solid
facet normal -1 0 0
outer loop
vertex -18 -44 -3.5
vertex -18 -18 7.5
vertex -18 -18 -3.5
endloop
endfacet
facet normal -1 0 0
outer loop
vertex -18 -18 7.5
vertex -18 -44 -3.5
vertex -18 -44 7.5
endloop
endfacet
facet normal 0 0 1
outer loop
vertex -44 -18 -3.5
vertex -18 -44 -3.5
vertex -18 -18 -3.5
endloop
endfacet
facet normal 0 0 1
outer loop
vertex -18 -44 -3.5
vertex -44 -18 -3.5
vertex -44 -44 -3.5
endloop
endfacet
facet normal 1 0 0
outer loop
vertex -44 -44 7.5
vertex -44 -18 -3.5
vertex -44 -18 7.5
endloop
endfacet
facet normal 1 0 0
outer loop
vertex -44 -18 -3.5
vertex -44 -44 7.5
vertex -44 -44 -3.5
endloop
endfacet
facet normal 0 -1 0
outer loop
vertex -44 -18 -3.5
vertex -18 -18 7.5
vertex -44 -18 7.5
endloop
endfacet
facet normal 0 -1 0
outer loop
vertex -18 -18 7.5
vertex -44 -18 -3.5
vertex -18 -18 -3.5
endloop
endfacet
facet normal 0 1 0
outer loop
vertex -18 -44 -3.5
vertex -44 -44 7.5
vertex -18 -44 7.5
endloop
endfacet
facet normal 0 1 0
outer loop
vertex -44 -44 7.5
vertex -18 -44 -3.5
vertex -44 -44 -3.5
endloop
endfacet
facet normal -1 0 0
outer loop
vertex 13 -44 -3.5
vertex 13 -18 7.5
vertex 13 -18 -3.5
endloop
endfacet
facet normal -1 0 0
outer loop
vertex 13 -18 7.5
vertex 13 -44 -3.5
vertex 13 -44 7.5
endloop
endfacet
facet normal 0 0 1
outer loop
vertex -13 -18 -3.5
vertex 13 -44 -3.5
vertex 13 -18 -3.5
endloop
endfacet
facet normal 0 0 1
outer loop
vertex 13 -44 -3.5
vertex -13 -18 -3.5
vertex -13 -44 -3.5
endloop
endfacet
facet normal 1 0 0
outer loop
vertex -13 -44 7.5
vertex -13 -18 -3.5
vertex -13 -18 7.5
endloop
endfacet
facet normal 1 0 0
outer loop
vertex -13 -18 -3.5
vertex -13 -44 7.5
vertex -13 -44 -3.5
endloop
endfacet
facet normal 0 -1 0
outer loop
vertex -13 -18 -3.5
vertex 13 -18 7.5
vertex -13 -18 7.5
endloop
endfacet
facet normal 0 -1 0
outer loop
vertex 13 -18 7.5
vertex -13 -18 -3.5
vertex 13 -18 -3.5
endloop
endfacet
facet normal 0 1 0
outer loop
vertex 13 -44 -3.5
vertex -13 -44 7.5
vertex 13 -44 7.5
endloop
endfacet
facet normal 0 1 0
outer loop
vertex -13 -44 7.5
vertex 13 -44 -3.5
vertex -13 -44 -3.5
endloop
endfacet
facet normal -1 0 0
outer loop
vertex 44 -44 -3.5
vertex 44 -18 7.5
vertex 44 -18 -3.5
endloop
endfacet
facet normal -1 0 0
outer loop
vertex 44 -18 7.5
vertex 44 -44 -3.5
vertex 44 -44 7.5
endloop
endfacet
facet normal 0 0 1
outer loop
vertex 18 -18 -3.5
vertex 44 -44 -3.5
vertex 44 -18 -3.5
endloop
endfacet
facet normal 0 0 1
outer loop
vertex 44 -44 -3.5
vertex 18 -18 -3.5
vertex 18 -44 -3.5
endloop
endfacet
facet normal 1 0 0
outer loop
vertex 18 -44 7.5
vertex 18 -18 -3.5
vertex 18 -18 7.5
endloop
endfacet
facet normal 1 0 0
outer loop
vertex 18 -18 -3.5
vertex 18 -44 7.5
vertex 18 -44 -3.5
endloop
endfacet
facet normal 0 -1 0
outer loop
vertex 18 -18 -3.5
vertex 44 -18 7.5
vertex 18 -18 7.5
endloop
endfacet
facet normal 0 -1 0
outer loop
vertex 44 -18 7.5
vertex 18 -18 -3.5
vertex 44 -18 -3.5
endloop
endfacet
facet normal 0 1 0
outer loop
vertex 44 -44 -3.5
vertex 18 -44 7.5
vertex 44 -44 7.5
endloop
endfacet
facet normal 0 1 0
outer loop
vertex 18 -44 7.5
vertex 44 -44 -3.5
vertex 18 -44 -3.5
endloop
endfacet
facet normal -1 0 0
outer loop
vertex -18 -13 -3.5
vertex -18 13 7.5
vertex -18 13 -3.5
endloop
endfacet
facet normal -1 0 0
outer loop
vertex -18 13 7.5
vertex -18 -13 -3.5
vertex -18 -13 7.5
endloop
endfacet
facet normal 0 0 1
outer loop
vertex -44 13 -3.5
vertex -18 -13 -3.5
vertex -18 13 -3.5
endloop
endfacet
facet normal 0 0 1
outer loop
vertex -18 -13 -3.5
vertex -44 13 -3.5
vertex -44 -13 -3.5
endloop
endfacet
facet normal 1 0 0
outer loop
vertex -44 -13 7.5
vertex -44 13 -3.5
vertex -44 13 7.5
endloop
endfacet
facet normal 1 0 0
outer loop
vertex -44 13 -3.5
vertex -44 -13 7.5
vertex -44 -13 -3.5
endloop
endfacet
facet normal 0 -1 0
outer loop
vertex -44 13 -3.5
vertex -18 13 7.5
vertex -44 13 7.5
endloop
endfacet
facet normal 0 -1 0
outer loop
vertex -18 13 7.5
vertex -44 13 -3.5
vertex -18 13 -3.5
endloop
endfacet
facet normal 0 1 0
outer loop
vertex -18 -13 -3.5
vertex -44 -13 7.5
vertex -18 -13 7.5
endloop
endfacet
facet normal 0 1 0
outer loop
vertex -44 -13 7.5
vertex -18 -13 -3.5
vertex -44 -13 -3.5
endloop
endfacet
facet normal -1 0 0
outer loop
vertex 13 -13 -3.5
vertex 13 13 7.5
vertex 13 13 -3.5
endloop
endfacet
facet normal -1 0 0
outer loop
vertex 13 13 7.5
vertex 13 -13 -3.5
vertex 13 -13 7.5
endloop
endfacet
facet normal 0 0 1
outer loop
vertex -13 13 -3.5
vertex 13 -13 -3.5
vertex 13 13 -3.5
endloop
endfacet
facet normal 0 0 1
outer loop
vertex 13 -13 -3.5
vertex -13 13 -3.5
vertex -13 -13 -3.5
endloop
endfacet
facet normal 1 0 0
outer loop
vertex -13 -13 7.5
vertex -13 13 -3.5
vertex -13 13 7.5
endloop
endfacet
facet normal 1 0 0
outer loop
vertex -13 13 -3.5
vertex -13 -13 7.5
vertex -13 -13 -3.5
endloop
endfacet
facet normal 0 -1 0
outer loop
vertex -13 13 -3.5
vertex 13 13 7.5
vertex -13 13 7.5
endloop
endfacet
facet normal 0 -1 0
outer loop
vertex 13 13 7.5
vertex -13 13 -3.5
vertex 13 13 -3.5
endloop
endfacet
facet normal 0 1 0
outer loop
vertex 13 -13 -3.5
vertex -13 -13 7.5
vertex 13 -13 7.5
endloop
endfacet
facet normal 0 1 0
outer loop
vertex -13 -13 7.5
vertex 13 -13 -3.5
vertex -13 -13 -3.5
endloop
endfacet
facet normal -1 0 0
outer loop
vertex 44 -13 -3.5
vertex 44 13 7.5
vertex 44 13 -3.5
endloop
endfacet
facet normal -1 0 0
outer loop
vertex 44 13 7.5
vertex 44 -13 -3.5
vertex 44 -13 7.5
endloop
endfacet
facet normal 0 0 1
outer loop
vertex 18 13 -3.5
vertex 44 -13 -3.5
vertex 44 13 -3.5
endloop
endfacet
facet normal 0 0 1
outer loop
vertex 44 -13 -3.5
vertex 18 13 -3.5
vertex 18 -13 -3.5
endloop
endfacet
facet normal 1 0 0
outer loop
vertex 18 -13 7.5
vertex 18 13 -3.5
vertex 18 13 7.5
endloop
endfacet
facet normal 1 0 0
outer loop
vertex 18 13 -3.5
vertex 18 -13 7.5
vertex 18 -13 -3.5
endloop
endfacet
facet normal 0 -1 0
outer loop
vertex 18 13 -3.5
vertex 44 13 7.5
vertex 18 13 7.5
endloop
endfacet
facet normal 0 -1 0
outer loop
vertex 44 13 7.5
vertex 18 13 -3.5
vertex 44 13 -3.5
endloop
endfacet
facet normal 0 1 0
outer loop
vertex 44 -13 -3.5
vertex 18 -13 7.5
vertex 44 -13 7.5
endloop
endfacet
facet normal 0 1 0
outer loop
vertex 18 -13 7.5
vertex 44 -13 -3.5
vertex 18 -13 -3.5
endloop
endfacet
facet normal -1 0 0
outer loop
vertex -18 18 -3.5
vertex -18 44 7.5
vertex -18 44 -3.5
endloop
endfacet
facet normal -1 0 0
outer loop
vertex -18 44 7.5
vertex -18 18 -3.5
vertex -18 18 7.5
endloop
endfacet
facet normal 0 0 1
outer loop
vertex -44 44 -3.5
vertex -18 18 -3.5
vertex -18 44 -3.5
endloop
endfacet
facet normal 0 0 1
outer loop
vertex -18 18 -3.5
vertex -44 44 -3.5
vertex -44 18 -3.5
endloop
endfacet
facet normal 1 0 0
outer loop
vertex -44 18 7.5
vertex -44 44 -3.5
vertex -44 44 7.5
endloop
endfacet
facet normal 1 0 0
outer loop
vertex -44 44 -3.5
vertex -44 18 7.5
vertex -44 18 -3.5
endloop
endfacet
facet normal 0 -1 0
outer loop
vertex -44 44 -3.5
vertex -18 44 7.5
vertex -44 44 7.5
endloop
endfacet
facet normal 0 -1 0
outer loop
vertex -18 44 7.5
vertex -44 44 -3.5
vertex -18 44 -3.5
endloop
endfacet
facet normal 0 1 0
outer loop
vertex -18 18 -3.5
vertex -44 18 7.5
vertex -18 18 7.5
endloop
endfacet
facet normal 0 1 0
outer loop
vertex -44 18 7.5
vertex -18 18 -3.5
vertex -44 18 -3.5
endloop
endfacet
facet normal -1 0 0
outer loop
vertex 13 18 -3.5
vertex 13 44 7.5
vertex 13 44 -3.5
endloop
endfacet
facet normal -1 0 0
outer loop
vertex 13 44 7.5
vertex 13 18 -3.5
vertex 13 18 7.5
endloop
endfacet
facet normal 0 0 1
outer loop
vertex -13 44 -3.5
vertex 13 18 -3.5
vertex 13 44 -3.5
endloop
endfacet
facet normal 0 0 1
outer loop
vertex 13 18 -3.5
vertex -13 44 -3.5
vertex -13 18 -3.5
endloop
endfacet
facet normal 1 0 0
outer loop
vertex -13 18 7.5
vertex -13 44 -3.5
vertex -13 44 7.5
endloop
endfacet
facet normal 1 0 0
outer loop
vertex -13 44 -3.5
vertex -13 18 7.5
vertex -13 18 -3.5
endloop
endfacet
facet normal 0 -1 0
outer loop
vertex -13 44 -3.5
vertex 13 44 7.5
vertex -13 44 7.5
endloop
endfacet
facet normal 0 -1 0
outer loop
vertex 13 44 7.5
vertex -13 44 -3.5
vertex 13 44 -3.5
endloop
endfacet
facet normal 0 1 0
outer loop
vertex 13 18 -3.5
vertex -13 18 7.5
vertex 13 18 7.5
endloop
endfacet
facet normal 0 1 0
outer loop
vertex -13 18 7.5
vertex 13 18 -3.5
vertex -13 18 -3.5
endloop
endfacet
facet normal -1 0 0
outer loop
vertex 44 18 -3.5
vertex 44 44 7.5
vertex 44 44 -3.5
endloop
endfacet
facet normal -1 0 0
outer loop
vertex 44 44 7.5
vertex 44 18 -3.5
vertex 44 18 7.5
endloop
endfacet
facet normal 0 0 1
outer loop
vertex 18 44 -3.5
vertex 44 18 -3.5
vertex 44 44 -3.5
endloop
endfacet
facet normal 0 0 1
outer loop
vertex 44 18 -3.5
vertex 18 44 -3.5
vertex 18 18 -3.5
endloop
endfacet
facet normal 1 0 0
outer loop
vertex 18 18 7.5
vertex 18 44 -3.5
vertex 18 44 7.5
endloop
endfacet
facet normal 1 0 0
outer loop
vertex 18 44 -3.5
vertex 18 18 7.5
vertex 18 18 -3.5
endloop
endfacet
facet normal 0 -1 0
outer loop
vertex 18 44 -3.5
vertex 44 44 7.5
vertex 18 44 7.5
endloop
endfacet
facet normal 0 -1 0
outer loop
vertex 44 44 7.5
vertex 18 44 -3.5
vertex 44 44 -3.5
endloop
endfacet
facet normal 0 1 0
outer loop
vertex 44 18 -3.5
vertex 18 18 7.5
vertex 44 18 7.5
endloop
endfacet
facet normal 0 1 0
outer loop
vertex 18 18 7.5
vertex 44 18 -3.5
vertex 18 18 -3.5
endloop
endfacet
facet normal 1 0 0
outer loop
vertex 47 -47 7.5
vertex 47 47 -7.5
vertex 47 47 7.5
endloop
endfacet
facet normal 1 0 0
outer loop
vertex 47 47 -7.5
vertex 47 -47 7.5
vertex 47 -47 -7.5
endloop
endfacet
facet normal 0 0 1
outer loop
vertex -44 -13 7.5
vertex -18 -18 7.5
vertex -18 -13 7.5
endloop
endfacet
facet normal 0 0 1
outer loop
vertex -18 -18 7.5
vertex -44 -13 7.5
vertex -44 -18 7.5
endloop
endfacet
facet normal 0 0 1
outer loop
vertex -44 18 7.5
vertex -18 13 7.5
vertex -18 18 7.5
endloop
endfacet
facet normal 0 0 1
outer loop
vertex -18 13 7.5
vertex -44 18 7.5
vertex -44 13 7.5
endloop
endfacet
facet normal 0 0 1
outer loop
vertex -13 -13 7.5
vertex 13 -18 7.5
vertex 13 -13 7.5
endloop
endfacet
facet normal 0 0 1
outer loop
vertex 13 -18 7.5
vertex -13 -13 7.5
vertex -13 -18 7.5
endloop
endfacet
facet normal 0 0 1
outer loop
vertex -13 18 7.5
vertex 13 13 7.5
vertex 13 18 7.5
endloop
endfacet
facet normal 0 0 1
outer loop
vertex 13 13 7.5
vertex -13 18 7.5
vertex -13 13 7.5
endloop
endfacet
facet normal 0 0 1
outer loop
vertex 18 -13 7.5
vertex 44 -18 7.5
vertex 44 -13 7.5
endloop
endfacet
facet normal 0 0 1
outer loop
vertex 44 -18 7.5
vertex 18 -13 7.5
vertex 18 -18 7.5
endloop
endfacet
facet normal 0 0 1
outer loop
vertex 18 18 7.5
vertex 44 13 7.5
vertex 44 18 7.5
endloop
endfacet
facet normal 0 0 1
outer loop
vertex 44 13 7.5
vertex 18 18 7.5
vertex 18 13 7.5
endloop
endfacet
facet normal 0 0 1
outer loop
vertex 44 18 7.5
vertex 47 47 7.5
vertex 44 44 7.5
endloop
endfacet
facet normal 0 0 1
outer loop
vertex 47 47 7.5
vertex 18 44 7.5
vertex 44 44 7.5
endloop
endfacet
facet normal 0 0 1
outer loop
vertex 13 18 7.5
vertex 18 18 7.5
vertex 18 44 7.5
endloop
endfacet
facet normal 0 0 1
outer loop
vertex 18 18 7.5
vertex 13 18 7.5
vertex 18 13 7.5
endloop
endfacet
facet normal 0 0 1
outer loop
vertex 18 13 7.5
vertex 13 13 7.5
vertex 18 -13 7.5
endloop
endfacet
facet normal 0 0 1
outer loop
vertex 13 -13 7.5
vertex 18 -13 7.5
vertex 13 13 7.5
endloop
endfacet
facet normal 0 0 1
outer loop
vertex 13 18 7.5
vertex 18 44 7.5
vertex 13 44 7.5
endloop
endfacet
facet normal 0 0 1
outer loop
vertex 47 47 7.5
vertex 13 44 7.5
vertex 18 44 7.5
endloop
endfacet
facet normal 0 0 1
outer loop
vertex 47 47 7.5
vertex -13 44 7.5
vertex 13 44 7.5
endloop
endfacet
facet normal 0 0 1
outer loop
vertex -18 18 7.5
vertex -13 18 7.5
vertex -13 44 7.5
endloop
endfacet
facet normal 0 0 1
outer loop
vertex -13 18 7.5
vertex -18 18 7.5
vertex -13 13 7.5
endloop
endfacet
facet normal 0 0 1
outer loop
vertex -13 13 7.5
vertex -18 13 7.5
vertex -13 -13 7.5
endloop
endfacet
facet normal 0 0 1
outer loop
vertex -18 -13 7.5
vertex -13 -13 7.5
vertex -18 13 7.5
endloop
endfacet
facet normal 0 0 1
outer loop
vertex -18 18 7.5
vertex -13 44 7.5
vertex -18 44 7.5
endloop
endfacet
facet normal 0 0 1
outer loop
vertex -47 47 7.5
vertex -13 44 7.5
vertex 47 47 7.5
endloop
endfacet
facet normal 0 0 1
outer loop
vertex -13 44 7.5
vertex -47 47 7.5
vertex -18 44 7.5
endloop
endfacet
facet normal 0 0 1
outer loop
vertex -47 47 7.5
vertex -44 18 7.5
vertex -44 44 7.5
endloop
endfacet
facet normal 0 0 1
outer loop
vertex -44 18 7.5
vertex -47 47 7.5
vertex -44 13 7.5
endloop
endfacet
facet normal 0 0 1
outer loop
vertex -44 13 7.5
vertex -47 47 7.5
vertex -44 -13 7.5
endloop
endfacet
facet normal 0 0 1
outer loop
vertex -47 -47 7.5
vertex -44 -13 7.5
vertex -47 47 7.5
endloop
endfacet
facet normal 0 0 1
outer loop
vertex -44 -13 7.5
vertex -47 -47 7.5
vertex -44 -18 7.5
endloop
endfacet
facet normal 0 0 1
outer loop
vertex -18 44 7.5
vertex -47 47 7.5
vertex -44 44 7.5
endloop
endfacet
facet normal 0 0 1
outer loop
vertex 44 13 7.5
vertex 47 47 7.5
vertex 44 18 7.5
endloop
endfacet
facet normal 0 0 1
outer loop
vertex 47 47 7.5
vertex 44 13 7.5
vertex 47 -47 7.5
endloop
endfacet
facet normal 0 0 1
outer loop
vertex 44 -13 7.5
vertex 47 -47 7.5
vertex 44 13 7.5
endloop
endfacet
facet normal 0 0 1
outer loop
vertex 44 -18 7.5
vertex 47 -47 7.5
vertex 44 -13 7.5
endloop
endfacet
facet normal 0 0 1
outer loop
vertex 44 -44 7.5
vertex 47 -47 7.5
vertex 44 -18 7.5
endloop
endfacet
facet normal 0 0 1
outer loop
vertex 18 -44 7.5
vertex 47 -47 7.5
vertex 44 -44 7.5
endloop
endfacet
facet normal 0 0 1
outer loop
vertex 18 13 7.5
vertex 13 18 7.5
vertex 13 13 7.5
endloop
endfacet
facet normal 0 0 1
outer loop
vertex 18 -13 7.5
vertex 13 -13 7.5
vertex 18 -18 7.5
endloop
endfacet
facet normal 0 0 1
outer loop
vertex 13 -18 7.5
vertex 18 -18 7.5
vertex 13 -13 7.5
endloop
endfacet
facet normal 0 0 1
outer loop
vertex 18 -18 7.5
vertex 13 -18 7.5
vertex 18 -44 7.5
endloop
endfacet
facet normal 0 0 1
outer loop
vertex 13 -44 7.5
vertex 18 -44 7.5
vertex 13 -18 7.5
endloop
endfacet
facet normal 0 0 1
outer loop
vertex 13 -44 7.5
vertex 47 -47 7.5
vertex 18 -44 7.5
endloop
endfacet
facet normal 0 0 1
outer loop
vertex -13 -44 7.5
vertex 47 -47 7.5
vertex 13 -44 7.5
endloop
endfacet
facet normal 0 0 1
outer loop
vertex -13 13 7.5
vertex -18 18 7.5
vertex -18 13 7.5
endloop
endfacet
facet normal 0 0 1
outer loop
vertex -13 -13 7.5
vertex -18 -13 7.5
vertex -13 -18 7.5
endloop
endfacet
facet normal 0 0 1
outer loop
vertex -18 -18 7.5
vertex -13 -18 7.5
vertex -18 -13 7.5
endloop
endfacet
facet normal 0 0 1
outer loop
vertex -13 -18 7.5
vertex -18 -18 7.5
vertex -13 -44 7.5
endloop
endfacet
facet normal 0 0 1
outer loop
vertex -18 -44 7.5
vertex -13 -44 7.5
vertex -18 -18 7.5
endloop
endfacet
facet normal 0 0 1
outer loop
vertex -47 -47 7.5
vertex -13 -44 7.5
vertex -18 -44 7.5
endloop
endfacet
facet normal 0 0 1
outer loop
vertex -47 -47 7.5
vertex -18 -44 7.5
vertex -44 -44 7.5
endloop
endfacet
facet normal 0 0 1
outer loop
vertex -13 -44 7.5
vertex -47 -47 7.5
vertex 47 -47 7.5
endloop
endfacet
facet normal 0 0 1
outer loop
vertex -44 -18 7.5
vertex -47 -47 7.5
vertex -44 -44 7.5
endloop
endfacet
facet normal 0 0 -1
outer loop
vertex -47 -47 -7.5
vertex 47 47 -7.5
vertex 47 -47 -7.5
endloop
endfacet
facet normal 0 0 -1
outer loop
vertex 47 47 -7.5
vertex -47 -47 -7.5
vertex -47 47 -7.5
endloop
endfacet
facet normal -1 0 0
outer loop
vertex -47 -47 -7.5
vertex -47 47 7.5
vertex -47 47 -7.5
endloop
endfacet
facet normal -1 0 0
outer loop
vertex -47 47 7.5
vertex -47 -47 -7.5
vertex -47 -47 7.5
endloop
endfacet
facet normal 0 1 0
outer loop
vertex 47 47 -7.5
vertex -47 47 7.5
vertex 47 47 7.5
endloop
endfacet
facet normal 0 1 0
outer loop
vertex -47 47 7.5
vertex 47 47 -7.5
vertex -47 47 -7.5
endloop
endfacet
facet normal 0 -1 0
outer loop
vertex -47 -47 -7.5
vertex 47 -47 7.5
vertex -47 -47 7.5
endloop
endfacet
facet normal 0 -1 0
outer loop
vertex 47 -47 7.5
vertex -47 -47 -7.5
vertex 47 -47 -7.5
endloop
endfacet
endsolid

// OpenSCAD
$fn = 32;

// ----------------------------------------------------------------------
// Pocket plate 94 x 94 x 15
// 3 x 3 pockets 26 mm square, 11 mm deep
// ----------------------------------------------------------------------

// --- parameters (mm) ---
thickness = 15;  // plate thickness
floor_t = 4;     // material left under each pocket
pocket = 26;     // pocket side length
pitch_x = 31;    // pocket pitch along X
pitch_y = 31;    // pocket pitch along Y
cols = 3;        // pockets per row
rows = 3;        // rows of pockets

// --- derived feature positions (mm) ---
depth = thickness - floor_t;        // = 11   pocket depth, down to the floor
span_x = (cols - 1) * pitch_x;      // = 62   distance between outer pockets
span_y = (rows - 1) * pitch_y;      // = 62   distance between outer pocket rows
origin_x = -span_x / 2;             // = -31   X of the first pocket
origin_y = -span_y / 2;             // = -31   Y of the first pocket
plate = [span_x + pocket + 6, span_y + pocket + 6, thickness];  // = [94, 94, 15]   overall size: pockets plus 3 mm of wall on each side
feature_centers = [
  [origin_x + 0 * pitch_x, origin_y + 0 * pitch_y],
  [origin_x + 1 * pitch_x, origin_y + 0 * pitch_y],
  [origin_x + 2 * pitch_x, origin_y + 0 * pitch_y],
  [origin_x + 0 * pitch_x, origin_y + 1 * pitch_y],
  [origin_x + 1 * pitch_x, origin_y + 1 * pitch_y],
  [origin_x + 2 * pitch_x, origin_y + 1 * pitch_y],
  [origin_x + 0 * pitch_x, origin_y + 2 * pitch_y],
  [origin_x + 1 * pitch_x, origin_y + 2 * pitch_y],
  [origin_x + 2 * pitch_x, origin_y + 2 * pitch_y]
];   // pocket centres, used verbatim by the cutter loop

// plate outline, then one pocket per centre in feature_centers
difference() {
  cube(plate, center = true);
  for (centre = feature_centers)
    translate([centre[0] - pocket / 2, centre[1] - pocket / 2, plate[2] / 2 - depth])
      cube([pocket, pocket, depth + 1]);  // centred on the declared pocket centre
}
